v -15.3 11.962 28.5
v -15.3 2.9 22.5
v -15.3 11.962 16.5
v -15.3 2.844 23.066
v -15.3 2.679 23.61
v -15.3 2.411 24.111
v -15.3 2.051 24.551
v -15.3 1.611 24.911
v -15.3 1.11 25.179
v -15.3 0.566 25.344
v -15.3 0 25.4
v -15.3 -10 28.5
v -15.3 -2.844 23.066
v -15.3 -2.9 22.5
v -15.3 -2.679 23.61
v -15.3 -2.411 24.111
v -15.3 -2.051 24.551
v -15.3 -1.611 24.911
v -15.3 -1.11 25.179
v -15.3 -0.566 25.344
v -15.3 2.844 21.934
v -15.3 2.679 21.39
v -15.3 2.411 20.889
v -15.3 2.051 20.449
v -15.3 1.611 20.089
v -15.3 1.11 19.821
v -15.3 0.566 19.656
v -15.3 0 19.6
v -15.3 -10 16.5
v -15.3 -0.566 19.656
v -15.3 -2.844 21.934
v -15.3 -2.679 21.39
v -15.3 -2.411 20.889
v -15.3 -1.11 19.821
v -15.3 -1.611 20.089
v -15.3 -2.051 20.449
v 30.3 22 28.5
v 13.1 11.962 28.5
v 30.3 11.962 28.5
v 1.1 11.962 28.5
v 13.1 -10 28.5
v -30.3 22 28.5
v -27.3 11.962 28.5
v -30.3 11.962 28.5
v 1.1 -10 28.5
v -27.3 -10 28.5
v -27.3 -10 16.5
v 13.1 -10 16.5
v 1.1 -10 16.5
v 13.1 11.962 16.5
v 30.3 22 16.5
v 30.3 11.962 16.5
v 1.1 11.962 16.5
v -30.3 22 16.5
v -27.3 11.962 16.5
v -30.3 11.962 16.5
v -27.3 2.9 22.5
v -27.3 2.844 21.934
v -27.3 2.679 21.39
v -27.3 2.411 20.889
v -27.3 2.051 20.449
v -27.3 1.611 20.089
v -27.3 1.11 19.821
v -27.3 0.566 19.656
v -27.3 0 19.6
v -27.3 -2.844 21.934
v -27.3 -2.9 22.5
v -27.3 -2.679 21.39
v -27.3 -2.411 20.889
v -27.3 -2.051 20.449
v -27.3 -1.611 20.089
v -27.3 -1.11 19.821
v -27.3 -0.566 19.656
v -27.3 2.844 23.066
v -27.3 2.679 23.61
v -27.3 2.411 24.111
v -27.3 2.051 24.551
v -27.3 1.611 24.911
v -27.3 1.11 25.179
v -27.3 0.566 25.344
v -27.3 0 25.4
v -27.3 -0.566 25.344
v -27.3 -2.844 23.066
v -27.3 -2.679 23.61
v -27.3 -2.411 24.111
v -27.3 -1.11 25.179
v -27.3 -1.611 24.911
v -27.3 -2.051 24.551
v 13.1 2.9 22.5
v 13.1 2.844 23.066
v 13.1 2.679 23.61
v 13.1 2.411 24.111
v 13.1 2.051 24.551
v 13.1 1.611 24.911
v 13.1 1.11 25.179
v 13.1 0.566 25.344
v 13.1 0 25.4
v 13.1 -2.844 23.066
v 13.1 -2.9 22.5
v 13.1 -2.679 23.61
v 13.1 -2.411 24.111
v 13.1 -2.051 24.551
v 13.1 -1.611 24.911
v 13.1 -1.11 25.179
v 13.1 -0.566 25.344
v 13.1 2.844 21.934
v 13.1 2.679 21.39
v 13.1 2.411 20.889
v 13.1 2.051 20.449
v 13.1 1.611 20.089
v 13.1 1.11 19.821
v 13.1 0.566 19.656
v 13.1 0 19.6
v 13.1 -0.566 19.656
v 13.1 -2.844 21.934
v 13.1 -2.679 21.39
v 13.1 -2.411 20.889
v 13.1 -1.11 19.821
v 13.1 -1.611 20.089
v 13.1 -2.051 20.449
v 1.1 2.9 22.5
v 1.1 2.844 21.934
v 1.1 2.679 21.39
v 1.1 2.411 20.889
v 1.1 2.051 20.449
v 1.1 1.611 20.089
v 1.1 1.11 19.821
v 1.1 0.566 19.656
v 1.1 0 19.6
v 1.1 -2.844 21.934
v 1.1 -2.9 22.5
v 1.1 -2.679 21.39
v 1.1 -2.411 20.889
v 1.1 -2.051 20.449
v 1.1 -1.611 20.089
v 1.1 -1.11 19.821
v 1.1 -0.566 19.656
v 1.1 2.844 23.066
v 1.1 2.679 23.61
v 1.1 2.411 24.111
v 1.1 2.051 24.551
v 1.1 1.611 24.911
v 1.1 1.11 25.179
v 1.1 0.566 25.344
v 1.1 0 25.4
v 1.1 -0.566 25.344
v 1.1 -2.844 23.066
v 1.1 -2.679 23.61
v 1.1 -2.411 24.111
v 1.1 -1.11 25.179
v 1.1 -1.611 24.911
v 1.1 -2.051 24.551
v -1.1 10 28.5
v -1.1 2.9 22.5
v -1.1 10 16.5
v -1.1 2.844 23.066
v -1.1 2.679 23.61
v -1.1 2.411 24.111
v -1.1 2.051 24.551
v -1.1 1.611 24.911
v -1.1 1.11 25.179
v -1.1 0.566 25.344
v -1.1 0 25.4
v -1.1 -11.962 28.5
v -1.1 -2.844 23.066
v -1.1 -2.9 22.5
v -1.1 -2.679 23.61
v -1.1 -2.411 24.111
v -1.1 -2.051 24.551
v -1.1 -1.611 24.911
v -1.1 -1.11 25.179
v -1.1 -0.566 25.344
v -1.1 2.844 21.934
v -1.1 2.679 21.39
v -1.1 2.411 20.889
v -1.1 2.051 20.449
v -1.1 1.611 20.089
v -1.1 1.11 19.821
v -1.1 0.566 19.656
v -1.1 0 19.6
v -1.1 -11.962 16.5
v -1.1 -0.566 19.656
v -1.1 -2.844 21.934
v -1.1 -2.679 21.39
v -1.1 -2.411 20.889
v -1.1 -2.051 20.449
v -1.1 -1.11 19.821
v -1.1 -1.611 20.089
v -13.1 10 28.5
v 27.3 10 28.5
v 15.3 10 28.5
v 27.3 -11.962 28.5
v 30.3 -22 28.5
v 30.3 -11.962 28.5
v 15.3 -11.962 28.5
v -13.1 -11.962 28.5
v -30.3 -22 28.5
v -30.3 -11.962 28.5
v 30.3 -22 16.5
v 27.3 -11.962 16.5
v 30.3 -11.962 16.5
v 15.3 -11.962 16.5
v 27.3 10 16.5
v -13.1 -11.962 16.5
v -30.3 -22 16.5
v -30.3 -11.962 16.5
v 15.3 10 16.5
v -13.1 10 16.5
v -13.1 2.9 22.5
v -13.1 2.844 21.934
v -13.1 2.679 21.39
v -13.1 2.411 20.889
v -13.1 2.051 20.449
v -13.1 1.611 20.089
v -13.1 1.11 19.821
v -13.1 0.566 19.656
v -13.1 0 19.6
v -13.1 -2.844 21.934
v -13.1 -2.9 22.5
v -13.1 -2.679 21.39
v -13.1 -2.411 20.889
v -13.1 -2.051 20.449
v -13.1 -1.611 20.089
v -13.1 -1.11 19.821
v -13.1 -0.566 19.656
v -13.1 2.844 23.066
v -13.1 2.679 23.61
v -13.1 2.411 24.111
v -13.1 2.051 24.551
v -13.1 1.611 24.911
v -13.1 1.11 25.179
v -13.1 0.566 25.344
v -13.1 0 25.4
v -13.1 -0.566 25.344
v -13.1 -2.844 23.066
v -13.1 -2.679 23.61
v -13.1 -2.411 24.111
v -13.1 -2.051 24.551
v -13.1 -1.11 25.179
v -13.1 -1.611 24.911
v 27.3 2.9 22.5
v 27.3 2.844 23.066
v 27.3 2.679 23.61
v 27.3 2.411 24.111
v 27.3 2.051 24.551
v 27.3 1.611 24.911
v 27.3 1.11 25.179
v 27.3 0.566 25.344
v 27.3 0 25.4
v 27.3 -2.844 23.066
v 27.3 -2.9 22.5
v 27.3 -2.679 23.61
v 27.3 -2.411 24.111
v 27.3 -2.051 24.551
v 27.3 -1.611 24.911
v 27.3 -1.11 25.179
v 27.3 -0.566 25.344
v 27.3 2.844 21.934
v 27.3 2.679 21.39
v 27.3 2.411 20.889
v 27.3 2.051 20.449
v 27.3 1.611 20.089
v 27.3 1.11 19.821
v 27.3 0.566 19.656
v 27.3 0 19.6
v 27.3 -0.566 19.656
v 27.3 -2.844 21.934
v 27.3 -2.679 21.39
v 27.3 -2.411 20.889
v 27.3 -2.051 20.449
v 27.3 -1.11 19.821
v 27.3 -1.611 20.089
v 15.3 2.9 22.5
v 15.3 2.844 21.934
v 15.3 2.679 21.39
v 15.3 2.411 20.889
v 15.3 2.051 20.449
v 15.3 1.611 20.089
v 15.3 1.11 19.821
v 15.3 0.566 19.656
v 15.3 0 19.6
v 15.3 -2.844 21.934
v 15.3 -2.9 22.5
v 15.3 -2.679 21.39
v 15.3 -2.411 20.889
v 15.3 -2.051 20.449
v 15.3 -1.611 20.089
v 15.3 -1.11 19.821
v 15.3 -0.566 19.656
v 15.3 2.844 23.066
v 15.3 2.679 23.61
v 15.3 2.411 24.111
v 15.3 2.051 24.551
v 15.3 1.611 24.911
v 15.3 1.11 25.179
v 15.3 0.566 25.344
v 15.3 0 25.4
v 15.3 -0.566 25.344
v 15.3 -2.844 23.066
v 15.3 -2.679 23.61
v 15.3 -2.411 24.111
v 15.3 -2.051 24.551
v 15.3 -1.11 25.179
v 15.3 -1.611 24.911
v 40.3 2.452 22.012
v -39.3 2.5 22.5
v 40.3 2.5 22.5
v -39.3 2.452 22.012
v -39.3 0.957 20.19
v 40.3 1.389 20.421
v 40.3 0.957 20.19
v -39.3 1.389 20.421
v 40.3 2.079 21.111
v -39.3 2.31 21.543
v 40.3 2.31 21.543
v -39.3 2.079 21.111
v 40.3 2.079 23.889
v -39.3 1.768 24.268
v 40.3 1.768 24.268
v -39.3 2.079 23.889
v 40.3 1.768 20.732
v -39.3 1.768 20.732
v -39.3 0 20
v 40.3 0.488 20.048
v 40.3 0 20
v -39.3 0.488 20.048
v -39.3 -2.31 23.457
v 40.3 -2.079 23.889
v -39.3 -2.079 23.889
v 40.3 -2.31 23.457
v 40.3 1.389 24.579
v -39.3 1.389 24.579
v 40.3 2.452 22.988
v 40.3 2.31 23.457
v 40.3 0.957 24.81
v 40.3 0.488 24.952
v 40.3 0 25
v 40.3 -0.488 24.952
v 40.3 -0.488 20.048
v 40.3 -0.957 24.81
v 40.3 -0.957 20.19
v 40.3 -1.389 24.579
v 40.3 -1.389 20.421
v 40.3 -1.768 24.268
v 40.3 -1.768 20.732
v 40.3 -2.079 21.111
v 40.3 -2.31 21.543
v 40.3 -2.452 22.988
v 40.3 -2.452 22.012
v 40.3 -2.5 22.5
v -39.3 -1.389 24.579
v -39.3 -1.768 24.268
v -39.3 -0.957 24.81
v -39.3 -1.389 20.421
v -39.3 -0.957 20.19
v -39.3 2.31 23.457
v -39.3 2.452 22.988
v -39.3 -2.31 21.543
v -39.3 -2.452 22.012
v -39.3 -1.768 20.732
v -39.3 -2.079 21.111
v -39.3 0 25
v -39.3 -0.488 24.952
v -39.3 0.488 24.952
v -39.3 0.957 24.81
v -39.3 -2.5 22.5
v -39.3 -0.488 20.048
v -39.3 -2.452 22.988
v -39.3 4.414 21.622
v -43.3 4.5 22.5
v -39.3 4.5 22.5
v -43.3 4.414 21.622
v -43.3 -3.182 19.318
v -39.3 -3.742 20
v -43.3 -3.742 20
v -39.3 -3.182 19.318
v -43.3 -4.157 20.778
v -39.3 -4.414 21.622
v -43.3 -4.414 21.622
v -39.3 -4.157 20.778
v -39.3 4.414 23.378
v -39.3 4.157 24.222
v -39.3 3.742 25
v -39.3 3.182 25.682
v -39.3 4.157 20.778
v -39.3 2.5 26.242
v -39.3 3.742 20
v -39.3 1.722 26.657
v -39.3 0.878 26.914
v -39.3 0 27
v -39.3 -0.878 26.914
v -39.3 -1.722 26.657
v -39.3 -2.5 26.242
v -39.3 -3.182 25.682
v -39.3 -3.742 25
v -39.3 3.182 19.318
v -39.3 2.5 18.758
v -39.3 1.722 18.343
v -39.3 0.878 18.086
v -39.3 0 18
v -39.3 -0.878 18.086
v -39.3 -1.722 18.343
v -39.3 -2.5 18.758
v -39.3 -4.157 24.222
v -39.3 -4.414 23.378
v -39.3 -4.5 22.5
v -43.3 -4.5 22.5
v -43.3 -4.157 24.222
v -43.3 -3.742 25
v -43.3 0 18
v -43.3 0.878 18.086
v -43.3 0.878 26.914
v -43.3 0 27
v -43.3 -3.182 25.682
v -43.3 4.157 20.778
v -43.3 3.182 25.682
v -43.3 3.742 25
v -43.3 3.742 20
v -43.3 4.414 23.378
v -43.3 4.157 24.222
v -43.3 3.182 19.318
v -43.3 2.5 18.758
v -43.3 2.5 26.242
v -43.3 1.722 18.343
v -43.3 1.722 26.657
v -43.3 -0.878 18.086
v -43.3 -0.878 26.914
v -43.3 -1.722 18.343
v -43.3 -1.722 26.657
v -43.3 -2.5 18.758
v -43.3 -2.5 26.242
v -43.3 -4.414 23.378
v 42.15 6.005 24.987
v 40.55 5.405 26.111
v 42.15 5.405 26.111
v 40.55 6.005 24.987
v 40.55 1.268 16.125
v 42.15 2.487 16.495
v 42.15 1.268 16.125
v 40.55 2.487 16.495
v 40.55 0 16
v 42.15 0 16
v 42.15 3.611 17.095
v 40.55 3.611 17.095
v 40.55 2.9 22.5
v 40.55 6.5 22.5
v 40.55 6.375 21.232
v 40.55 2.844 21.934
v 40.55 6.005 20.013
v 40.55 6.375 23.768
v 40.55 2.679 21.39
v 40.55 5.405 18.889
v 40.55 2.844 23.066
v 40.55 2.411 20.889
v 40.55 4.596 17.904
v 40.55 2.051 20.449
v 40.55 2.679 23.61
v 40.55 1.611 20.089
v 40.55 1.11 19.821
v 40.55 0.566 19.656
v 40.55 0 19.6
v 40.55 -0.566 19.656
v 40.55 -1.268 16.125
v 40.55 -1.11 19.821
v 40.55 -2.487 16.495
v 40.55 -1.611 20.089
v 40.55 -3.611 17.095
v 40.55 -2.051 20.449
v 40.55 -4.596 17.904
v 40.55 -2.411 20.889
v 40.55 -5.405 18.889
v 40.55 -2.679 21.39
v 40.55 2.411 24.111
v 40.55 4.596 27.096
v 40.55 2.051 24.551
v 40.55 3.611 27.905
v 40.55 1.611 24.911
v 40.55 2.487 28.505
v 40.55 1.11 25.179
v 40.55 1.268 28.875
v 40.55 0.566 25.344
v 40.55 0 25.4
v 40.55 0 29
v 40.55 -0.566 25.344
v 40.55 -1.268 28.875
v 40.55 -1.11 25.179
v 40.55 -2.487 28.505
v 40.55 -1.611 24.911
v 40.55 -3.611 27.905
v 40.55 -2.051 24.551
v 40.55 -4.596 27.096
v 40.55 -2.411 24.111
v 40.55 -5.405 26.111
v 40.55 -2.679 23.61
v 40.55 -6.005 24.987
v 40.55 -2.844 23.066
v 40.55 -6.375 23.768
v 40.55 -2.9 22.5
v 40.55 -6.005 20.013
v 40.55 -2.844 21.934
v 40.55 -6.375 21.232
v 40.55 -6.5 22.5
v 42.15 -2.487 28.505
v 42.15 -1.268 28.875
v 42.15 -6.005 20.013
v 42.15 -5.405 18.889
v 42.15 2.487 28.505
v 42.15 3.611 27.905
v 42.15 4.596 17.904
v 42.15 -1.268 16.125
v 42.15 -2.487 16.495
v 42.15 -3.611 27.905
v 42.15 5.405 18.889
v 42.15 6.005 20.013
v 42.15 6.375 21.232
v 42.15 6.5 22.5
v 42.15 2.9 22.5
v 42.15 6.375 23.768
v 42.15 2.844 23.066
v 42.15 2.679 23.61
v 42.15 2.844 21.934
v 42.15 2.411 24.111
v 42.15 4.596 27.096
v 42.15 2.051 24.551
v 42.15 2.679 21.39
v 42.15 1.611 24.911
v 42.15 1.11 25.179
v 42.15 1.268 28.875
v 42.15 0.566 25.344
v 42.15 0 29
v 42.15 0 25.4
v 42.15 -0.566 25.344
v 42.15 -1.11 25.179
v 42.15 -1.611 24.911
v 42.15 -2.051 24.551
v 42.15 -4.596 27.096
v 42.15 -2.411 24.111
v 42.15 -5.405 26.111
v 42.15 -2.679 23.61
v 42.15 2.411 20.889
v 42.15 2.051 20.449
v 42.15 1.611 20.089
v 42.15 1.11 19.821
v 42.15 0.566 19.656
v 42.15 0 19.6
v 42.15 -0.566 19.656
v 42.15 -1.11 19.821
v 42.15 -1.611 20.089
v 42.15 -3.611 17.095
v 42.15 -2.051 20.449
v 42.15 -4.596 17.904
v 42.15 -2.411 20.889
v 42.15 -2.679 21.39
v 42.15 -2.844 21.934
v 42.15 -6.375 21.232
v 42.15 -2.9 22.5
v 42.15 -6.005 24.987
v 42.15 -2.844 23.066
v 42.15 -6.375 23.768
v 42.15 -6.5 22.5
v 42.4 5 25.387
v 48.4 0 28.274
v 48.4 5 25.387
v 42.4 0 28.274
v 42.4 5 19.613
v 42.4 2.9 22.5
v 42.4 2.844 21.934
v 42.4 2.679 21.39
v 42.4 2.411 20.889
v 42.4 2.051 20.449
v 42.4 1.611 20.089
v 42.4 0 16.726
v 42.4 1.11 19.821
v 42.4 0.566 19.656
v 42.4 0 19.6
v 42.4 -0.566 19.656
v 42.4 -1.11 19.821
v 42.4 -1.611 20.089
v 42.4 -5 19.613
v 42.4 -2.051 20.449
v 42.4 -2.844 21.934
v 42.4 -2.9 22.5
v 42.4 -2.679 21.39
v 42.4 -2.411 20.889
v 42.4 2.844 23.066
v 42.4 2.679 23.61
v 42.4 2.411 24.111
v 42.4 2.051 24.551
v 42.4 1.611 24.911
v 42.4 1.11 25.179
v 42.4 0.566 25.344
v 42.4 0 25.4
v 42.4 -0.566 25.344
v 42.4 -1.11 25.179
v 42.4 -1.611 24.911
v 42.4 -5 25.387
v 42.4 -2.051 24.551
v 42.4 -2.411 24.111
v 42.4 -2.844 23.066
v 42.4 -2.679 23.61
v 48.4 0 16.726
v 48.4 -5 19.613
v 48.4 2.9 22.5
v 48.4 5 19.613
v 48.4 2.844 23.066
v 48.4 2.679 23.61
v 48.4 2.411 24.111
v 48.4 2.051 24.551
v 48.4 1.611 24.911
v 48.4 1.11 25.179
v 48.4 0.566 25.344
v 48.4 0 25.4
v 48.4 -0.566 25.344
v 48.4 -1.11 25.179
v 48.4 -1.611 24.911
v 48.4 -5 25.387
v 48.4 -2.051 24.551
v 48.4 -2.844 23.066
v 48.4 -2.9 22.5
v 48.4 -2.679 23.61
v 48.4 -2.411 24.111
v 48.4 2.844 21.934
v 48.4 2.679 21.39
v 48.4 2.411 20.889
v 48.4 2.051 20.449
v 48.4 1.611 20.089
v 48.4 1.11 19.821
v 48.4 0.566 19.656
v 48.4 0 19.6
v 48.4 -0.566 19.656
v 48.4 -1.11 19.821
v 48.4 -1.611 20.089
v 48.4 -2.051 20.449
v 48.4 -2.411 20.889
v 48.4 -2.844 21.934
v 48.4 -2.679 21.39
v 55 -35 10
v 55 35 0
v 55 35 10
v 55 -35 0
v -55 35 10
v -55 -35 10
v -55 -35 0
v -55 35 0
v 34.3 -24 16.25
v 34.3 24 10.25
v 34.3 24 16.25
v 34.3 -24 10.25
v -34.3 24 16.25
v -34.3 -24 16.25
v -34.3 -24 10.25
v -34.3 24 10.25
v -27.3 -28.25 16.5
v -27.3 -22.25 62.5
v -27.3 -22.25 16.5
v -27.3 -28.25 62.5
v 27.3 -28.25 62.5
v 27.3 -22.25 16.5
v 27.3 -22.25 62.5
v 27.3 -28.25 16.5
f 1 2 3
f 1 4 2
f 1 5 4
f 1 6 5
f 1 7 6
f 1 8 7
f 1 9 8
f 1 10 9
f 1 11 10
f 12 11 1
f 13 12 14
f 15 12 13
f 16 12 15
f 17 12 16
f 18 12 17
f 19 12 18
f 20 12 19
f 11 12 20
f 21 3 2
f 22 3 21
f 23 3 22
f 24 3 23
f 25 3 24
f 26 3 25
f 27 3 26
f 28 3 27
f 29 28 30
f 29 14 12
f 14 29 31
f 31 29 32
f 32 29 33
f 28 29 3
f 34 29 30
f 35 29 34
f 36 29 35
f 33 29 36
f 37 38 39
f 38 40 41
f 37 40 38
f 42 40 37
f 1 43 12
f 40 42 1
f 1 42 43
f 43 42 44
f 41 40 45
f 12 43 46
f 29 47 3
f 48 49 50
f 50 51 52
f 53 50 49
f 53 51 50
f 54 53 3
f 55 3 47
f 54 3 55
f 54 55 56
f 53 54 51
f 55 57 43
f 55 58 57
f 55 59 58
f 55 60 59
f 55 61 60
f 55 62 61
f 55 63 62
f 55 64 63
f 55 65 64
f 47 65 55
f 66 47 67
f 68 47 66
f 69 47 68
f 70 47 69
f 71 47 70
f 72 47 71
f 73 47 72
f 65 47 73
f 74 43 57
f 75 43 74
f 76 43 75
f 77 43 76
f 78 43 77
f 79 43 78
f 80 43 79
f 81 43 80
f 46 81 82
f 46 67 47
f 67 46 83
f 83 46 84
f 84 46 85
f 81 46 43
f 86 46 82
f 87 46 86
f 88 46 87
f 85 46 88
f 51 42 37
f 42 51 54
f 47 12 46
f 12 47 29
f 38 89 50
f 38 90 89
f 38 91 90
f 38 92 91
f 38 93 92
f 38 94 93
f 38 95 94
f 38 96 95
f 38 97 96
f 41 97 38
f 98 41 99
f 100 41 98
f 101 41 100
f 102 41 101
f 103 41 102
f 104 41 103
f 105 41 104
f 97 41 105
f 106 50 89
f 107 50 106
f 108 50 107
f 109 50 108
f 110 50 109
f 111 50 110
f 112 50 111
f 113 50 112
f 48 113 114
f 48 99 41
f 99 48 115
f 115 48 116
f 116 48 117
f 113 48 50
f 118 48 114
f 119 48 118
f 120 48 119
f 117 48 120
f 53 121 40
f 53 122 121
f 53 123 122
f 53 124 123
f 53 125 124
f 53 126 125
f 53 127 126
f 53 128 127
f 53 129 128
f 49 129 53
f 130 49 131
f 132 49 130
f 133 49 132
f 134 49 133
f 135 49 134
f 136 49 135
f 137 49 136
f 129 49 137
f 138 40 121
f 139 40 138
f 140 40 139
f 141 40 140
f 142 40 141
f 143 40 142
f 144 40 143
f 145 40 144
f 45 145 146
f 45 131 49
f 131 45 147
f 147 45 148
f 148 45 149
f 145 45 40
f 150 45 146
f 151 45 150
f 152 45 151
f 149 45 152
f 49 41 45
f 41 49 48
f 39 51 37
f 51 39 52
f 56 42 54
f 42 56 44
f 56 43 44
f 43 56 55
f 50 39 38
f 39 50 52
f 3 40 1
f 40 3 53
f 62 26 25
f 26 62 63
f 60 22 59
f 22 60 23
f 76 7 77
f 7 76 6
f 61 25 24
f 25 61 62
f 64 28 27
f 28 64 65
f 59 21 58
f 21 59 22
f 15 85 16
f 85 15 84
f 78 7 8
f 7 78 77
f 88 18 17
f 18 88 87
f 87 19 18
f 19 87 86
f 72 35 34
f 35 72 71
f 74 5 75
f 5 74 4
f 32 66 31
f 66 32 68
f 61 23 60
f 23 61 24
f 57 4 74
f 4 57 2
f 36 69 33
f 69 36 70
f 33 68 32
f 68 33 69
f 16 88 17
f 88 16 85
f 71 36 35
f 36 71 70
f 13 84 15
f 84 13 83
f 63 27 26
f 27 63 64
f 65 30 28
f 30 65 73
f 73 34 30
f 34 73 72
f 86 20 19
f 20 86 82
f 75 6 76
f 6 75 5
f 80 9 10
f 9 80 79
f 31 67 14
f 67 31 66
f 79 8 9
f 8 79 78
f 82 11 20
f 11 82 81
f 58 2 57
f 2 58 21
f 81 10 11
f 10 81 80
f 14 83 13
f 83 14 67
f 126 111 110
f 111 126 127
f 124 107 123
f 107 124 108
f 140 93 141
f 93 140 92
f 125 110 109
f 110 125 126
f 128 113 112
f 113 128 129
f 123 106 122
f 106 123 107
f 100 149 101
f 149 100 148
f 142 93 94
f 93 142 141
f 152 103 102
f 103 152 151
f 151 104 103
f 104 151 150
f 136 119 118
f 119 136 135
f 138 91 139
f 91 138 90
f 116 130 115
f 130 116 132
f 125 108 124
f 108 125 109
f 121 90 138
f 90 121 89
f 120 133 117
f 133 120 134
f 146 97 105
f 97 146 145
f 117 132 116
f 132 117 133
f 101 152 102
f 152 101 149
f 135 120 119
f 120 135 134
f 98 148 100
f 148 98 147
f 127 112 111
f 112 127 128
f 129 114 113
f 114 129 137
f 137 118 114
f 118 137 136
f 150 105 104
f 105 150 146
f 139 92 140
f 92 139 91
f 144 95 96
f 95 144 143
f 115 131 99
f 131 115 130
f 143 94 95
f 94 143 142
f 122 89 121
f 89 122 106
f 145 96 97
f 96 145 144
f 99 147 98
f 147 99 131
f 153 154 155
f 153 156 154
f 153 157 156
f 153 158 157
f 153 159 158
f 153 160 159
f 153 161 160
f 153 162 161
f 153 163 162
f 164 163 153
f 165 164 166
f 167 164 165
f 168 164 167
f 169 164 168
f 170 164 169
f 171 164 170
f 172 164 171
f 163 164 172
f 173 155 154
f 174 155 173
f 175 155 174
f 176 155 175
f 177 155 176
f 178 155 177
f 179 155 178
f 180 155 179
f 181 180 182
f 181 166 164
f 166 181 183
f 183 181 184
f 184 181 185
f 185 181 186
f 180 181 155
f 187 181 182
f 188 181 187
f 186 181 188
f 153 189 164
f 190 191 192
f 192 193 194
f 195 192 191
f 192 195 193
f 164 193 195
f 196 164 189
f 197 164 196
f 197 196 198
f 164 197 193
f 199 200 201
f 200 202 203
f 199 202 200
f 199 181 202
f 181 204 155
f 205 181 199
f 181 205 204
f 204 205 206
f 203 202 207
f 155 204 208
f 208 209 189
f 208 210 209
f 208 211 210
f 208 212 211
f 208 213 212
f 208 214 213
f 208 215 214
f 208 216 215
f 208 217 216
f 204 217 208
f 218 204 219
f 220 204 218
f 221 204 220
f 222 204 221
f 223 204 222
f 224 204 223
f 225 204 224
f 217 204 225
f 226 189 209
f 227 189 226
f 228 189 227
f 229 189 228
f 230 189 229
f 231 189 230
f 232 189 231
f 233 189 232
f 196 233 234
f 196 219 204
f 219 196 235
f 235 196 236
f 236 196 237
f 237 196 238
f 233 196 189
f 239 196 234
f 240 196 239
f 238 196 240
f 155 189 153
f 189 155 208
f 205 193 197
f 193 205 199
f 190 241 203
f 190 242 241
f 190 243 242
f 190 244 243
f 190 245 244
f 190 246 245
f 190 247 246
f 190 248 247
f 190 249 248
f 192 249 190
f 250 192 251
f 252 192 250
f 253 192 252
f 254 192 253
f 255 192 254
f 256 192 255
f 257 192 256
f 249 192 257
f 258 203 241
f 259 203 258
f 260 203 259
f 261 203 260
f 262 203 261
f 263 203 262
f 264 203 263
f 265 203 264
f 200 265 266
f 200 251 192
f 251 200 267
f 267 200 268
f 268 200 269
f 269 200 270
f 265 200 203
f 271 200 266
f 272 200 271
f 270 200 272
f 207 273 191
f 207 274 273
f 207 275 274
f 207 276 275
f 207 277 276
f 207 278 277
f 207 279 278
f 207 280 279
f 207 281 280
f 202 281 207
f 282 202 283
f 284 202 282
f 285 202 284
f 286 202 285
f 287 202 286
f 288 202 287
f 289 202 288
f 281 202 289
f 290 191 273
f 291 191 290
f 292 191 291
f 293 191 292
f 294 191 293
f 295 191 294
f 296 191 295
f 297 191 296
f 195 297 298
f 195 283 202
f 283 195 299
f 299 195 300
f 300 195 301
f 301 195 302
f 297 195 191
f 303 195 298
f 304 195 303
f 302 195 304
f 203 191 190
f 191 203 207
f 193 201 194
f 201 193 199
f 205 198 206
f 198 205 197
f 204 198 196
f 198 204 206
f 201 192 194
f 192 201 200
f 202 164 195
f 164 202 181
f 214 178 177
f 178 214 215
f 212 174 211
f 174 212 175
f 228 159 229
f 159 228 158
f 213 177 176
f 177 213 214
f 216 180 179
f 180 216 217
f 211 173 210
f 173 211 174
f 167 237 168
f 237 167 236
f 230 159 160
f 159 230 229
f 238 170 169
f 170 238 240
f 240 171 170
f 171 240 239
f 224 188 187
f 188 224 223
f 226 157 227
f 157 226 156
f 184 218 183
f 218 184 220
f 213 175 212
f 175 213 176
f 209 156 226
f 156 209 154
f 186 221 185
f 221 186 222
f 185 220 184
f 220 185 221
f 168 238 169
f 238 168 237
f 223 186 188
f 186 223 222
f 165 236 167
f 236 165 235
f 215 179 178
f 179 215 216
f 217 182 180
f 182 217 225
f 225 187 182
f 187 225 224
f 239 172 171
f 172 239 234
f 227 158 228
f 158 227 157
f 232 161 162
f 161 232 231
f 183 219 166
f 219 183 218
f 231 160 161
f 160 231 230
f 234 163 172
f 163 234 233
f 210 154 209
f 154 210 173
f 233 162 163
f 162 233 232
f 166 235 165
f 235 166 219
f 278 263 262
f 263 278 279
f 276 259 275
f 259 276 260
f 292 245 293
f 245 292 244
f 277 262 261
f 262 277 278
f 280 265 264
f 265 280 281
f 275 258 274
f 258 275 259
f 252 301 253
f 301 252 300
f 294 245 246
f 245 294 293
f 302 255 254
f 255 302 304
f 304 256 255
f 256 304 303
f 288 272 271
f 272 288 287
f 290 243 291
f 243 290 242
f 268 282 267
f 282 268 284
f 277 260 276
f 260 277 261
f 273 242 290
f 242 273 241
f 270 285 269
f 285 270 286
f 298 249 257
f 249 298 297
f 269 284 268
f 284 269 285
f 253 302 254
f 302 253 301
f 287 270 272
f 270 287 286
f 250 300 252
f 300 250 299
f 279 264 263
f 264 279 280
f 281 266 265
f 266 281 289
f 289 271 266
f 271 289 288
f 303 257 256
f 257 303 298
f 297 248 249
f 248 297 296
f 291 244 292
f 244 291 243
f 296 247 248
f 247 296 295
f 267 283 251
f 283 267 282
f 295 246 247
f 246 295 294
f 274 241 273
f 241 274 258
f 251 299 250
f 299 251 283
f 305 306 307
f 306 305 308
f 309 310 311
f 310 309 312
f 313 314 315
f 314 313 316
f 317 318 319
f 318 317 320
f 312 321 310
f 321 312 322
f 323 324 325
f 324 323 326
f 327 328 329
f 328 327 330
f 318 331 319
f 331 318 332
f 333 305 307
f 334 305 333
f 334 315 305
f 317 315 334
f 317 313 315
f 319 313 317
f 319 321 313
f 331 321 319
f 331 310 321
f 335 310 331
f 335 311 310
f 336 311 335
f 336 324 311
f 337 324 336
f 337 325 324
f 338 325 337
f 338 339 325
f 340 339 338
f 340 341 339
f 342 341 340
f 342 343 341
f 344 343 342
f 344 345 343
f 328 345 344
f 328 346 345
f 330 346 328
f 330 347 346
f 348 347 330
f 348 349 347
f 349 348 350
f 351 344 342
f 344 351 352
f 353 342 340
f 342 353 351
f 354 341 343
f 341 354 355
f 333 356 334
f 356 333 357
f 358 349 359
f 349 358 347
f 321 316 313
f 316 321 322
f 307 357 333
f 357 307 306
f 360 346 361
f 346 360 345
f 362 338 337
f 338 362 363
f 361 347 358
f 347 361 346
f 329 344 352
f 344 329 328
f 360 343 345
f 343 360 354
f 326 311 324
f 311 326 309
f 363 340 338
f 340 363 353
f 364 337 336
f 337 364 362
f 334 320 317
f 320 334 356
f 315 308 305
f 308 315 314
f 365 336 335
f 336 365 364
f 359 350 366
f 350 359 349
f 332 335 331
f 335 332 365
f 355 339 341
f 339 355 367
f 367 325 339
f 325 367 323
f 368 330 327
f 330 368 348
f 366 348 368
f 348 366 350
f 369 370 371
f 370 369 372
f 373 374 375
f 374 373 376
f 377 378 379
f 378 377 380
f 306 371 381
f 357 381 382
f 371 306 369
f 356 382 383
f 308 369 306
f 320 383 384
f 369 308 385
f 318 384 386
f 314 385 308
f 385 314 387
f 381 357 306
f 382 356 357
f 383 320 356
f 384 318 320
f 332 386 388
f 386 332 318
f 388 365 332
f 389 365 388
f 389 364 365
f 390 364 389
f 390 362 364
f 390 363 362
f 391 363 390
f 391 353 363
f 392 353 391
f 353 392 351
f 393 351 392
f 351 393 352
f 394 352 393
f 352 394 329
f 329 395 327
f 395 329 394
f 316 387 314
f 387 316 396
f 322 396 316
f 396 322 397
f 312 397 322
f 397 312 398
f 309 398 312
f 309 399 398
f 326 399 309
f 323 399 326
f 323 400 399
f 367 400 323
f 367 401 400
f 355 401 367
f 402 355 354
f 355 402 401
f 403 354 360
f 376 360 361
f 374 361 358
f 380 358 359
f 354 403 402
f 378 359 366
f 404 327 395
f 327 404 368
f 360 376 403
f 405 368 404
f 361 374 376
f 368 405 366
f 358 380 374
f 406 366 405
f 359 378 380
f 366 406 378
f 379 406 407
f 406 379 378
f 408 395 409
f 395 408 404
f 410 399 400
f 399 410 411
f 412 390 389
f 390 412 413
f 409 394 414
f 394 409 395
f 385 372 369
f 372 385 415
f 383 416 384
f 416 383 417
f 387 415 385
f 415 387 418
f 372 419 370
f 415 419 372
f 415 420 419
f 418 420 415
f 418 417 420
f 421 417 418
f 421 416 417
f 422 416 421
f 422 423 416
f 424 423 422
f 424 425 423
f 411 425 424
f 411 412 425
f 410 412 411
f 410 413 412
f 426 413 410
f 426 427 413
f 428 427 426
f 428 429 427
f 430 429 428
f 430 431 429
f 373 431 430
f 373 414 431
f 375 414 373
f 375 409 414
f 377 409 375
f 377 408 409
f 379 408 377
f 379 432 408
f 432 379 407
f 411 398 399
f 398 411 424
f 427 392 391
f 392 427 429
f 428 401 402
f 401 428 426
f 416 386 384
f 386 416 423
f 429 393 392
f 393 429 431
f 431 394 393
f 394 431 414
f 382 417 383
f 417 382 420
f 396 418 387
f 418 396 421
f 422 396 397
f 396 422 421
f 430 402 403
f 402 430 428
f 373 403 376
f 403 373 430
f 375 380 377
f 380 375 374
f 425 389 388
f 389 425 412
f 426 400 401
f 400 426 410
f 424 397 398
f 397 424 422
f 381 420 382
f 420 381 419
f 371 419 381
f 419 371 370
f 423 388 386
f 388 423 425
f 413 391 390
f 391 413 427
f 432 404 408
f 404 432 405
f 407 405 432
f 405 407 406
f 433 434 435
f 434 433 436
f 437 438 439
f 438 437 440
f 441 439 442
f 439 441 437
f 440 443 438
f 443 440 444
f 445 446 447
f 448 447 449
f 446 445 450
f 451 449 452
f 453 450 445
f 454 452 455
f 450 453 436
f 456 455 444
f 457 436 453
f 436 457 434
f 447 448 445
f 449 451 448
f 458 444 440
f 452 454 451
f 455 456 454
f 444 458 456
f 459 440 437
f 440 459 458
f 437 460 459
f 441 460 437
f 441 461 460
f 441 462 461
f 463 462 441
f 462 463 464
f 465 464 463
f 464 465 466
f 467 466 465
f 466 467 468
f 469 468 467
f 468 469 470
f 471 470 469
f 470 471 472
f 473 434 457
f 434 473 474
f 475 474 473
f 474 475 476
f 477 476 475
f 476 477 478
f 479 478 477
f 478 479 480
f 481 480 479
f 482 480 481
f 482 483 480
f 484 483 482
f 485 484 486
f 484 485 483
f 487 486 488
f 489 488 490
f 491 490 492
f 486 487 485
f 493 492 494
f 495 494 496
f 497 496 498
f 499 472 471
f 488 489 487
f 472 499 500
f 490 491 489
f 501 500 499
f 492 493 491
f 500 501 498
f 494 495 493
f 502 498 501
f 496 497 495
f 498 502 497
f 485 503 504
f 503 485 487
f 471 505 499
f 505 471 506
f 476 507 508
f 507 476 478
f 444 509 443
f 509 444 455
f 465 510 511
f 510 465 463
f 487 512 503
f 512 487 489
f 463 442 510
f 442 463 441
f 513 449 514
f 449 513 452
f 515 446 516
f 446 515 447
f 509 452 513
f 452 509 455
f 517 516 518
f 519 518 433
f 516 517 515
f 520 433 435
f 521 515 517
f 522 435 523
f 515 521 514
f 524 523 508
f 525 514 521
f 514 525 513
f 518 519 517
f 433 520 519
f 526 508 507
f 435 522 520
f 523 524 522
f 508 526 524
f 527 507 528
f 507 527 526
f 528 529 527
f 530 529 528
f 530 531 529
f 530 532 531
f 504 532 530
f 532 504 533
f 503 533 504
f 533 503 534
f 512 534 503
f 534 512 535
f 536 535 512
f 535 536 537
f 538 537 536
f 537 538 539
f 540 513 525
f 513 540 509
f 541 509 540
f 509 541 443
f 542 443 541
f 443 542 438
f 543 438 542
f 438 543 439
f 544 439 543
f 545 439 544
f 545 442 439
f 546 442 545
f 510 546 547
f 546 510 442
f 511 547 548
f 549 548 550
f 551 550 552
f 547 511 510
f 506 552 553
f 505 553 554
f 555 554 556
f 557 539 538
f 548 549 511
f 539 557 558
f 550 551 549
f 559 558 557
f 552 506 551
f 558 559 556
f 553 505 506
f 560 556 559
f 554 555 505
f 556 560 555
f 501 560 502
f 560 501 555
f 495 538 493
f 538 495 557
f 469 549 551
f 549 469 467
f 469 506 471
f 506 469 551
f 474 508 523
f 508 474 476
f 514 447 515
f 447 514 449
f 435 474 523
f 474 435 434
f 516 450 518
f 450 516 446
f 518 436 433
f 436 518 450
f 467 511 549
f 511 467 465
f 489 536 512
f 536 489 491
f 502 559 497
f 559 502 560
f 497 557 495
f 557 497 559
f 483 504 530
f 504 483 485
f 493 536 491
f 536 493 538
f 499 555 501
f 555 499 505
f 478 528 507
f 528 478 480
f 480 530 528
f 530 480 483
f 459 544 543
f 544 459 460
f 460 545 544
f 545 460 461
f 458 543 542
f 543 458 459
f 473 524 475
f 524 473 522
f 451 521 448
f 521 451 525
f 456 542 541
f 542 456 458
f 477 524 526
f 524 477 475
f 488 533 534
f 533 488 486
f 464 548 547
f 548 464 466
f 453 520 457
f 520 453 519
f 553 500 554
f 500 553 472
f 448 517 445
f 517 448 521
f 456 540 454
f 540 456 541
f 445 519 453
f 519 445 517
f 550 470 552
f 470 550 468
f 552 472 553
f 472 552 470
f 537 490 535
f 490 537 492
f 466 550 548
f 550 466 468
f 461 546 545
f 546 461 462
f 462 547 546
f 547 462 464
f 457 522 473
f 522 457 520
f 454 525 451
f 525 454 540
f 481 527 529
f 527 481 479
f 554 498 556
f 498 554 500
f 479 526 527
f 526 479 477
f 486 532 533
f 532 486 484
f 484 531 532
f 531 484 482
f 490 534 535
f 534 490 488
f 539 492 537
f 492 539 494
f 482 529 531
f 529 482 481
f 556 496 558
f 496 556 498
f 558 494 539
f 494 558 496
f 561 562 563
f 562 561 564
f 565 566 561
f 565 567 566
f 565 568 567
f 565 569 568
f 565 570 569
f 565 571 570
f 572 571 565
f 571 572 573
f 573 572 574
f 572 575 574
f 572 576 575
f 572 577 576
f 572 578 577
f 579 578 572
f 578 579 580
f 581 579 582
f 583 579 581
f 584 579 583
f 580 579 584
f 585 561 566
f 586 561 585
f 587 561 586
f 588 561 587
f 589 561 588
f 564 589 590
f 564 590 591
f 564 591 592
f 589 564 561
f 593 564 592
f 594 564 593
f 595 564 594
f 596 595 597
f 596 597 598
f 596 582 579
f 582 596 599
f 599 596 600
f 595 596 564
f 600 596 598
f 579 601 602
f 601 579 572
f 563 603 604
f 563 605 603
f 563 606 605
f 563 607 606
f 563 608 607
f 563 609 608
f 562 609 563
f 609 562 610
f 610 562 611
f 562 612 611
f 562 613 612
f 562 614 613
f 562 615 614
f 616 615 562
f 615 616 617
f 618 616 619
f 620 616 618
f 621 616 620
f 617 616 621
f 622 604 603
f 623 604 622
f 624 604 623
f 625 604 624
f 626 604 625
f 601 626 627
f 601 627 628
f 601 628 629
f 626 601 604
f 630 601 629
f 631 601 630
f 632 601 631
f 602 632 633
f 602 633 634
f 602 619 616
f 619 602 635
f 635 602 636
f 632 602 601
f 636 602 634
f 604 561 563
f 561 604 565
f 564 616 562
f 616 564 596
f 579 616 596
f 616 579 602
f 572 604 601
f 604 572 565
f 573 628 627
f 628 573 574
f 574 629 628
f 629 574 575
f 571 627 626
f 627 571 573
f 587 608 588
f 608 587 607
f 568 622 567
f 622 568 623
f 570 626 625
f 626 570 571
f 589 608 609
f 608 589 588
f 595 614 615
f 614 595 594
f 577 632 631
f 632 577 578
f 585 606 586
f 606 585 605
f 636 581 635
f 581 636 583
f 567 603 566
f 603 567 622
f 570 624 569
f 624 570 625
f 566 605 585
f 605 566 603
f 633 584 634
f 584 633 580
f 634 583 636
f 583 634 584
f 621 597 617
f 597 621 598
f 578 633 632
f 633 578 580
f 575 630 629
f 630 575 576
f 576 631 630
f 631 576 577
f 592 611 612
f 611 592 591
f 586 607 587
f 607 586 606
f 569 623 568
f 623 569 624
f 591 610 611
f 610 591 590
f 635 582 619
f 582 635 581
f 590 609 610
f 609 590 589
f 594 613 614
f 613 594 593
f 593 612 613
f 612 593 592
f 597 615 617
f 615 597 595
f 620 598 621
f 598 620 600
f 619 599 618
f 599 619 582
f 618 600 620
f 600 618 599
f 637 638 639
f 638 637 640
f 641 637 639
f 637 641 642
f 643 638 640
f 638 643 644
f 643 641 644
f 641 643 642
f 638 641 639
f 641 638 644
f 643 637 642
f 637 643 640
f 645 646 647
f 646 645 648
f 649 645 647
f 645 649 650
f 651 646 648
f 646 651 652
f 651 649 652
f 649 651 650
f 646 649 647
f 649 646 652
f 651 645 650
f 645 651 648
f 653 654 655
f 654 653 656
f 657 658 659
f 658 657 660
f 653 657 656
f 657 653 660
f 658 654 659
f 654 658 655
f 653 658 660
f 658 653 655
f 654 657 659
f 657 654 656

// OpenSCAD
$fn = 32;

// ------------------------------------------------------------------------
// Comb hinge with flap: leaf 60.6 x 22 mm, pin d5, flap 46 mm
// Every part is its own module, assembly() places every instance.
// ------------------------------------------------------------------------

// --- part 1 ---
module hinge_bed() {
  difference() {
    translate([-55, -35, 0]) cube([110, 70, 10]);
  }
}

// --- part 2 ---
module hinge_riser() {
  difference() {
    translate([-34.3, -24, 0]) cube([68.6, 48, 6]);
  }
}

// --- part 3 ---
module hinge_leaf_a() {
  difference() {
    union() {
      translate([-27.3, -10, -6]) cube([12, 32, 12]);
      translate([1.1, -10, -6]) cube([12, 32, 12]);
      translate([-30.3, 11.962, -6]) cube([60.6, 10.038, 12]);
    }
    translate([-21.3, 0, 0]) rotate([0, 90, 0]) cylinder(h = 14, d = 5.8, center = true);
    translate([7.1, 0, 0]) rotate([0, 90, 0]) cylinder(h = 14, d = 5.8, center = true);
  }
}

// --- part 4 ---
module hinge_leaf_b() {
  difference() {
    union() {
      translate([-13.1, -22, -6]) cube([12, 32, 12]);
      translate([15.3, -22, -6]) cube([12, 32, 12]);
      translate([-30.3, -22, -6]) cube([60.6, 10.038, 12]);
    }
    translate([-7.1, 0, 0]) rotate([0, 90, 0]) cylinder(h = 14, d = 5.8, center = true);
    translate([21.3, 0, 0]) rotate([0, 90, 0]) cylinder(h = 14, d = 5.8, center = true);
  }
}

// --- part 5 ---
module hinge_flap() {
  difference() {
    translate([-27.3, -23, 0]) cube([54.6, 46, 6]);
  }
}

// --- part 6 ---
module hinge_pin() {
  rotate([0, 90, 0]) cylinder(h = 80.6, d = 5, center = true);
  translate([-43.3, 0, 0]) rotate([0, 90, 0]) cylinder(h = 4, d = 9);
}

// --- part 7 ---
module pin_washer() {
  difference() {
      translate([0, 0, 0]) cylinder(h = 1.6, d = 13);
      translate([0, 0, -1]) cylinder(h = 3.6, d = 5.8);
    }
}

// --- part 8 ---
module pin_nut() {
  difference() {
    linear_extrude(height = 6) polygon(points = [[5.774, 0], [2.887, 5], [-2.887, 5], [-5.774, 0], [-2.887, -5], [2.887, -5]]);
    translate([0, 0, -1]) cylinder(h = 8, d = 5.8);
  }
}

// --- assembly ---
module assembly() {
  color([0.80, 0.24, 0.20]) translate([0, 0, 0]) rotate([0, 0, 0]) hinge_bed();
  color([0.20, 0.45, 0.75]) translate([0, 0, 10.25]) rotate([0, 0, 0]) hinge_riser();
  color([0.25, 0.62, 0.32]) translate([0, 0, 22.5]) rotate([0, 0, 0]) hinge_leaf_a();
  color([0.92, 0.70, 0.18]) translate([0, 0, 22.5]) rotate([0, 0, 0]) hinge_leaf_b();
  color([0.58, 0.35, 0.70]) translate([0, -22.25, 39.5]) rotate([90, 0, 0]) hinge_flap();
  color([0.16, 0.66, 0.66]) translate([0, 0, 22.5]) rotate([0, 0, 0]) hinge_pin();
  color([0.85, 0.48, 0.18]) translate([40.55, 0, 22.5]) rotate([0, 90, 0]) pin_washer();
  color([0.55, 0.60, 0.65]) translate([42.4, 0, 22.5]) rotate([0, 90, 0]) pin_nut();
}

assembly();
